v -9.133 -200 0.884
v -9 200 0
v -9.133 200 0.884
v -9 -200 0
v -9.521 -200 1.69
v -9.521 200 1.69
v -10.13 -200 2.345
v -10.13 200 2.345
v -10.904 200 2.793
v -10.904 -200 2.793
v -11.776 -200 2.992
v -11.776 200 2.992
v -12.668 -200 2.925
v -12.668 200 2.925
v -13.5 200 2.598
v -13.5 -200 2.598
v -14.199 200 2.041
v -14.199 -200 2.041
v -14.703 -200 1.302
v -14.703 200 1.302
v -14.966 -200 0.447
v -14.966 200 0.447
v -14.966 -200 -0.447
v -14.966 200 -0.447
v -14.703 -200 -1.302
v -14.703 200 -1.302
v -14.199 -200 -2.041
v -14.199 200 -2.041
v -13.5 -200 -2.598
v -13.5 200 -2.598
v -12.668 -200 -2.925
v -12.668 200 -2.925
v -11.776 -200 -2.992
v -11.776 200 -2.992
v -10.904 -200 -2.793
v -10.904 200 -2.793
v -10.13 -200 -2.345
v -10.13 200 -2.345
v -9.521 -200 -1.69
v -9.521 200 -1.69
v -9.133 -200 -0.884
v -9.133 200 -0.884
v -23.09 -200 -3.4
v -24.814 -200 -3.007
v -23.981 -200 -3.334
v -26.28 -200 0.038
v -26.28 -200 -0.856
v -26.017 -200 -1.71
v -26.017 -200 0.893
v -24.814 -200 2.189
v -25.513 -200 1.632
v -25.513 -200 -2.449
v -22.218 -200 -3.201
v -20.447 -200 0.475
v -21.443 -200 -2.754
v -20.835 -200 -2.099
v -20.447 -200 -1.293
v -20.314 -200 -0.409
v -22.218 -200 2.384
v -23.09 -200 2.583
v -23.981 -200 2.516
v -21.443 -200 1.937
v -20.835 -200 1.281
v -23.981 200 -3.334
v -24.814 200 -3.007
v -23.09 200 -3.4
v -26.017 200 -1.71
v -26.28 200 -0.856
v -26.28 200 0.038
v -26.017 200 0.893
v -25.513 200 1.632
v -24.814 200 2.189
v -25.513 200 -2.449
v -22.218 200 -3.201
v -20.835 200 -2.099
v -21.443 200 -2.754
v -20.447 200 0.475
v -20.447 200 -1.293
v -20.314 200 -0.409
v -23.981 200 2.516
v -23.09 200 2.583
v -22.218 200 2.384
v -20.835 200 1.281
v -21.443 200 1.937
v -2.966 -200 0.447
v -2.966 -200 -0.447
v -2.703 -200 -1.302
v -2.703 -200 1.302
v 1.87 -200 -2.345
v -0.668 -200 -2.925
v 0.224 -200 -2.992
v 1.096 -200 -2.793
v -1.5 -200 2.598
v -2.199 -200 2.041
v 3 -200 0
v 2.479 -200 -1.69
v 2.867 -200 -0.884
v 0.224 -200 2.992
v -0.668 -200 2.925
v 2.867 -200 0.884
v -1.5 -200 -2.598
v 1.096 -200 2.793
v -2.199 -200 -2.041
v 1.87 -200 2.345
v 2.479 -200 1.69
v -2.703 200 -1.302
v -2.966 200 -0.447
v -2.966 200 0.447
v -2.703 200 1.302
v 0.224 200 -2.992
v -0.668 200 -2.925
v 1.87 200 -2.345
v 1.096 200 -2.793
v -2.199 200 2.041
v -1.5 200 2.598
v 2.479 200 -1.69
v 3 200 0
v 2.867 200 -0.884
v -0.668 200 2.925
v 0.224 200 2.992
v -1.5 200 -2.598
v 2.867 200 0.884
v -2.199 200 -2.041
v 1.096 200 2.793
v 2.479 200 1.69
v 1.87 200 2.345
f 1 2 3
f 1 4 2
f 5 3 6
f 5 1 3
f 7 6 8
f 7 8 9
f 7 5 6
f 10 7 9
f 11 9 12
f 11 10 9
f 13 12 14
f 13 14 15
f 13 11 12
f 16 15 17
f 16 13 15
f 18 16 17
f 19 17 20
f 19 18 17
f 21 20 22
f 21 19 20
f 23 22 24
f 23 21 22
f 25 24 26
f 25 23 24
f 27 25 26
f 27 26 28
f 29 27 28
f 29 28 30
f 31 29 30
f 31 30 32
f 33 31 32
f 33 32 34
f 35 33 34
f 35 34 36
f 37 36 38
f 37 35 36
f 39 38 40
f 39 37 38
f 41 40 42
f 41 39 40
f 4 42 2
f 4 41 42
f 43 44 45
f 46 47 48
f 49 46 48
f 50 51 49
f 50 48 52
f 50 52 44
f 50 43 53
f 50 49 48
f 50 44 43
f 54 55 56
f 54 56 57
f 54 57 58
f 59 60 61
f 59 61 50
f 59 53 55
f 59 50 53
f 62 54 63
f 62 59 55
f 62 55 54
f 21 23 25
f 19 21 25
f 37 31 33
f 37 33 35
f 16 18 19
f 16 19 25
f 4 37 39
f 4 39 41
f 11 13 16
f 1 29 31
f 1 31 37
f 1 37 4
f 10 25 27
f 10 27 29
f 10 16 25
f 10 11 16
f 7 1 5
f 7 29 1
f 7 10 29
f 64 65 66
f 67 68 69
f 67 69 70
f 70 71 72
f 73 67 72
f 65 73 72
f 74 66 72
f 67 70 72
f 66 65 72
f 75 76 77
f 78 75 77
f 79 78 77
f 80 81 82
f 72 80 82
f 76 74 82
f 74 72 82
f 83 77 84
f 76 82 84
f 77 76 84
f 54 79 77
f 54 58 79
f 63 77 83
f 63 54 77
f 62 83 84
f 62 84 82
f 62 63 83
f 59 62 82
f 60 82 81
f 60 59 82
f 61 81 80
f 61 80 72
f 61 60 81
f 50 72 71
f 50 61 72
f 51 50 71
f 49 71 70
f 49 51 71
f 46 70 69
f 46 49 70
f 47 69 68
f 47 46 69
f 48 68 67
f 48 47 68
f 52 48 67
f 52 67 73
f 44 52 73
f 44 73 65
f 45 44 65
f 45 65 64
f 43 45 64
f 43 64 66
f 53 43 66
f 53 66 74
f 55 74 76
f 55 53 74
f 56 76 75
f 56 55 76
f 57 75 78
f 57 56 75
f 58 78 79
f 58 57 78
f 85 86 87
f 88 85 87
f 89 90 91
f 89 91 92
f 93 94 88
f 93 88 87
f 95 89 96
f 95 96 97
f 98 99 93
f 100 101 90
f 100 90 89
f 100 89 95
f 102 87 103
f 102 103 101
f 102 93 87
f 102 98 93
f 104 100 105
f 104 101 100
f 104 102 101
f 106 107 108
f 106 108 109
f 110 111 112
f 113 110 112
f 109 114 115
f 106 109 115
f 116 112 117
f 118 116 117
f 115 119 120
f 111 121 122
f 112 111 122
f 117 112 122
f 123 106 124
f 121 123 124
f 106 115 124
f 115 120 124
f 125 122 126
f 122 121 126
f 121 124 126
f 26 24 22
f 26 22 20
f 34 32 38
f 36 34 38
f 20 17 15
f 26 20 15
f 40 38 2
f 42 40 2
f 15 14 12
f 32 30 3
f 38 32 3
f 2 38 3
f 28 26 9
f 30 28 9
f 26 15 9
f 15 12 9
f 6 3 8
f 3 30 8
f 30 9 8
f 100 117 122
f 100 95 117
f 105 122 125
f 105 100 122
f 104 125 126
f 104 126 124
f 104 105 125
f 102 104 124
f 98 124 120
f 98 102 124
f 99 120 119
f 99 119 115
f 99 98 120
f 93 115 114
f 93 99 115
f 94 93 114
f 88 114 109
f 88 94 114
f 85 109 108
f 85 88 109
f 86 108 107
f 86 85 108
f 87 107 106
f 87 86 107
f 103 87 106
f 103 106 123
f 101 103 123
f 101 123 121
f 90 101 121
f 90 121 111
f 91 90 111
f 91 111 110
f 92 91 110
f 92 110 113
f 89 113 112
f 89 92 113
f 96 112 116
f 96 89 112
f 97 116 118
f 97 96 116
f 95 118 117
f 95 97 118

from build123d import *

# Parameters (mm, degrees)
F0_R     = 3
F1_DEPTH = 200
F2_R     = 3
F3_DEPTH = 200
F4_R     = 3
F5_DEPTH = 200


with BuildPart() as f1:
    # F0 (on Front) → F1 (new body, symmetric)
    with BuildSketch(Plane.XZ):
        Circle(F0_R)
    extrude(amount=F1_DEPTH, both=True)


with BuildPart() as f3:
    # F2 (on Front) → F3 (new body, symmetric)
    with BuildSketch(Plane.XZ):
        with Locations((-12, 0)):
            Circle(F2_R)
    extrude(amount=F3_DEPTH, both=True)


with BuildPart() as f5:
    # F4 (on Front) → F5 (new body, symmetric)
    with BuildSketch(Plane.XZ):
        with Locations((-23.313925, -0.408772)):
            Circle(F4_R)
    extrude(amount=F5_DEPTH, both=True)


solid = Compound([f1.part, f3.part, f5.part])
